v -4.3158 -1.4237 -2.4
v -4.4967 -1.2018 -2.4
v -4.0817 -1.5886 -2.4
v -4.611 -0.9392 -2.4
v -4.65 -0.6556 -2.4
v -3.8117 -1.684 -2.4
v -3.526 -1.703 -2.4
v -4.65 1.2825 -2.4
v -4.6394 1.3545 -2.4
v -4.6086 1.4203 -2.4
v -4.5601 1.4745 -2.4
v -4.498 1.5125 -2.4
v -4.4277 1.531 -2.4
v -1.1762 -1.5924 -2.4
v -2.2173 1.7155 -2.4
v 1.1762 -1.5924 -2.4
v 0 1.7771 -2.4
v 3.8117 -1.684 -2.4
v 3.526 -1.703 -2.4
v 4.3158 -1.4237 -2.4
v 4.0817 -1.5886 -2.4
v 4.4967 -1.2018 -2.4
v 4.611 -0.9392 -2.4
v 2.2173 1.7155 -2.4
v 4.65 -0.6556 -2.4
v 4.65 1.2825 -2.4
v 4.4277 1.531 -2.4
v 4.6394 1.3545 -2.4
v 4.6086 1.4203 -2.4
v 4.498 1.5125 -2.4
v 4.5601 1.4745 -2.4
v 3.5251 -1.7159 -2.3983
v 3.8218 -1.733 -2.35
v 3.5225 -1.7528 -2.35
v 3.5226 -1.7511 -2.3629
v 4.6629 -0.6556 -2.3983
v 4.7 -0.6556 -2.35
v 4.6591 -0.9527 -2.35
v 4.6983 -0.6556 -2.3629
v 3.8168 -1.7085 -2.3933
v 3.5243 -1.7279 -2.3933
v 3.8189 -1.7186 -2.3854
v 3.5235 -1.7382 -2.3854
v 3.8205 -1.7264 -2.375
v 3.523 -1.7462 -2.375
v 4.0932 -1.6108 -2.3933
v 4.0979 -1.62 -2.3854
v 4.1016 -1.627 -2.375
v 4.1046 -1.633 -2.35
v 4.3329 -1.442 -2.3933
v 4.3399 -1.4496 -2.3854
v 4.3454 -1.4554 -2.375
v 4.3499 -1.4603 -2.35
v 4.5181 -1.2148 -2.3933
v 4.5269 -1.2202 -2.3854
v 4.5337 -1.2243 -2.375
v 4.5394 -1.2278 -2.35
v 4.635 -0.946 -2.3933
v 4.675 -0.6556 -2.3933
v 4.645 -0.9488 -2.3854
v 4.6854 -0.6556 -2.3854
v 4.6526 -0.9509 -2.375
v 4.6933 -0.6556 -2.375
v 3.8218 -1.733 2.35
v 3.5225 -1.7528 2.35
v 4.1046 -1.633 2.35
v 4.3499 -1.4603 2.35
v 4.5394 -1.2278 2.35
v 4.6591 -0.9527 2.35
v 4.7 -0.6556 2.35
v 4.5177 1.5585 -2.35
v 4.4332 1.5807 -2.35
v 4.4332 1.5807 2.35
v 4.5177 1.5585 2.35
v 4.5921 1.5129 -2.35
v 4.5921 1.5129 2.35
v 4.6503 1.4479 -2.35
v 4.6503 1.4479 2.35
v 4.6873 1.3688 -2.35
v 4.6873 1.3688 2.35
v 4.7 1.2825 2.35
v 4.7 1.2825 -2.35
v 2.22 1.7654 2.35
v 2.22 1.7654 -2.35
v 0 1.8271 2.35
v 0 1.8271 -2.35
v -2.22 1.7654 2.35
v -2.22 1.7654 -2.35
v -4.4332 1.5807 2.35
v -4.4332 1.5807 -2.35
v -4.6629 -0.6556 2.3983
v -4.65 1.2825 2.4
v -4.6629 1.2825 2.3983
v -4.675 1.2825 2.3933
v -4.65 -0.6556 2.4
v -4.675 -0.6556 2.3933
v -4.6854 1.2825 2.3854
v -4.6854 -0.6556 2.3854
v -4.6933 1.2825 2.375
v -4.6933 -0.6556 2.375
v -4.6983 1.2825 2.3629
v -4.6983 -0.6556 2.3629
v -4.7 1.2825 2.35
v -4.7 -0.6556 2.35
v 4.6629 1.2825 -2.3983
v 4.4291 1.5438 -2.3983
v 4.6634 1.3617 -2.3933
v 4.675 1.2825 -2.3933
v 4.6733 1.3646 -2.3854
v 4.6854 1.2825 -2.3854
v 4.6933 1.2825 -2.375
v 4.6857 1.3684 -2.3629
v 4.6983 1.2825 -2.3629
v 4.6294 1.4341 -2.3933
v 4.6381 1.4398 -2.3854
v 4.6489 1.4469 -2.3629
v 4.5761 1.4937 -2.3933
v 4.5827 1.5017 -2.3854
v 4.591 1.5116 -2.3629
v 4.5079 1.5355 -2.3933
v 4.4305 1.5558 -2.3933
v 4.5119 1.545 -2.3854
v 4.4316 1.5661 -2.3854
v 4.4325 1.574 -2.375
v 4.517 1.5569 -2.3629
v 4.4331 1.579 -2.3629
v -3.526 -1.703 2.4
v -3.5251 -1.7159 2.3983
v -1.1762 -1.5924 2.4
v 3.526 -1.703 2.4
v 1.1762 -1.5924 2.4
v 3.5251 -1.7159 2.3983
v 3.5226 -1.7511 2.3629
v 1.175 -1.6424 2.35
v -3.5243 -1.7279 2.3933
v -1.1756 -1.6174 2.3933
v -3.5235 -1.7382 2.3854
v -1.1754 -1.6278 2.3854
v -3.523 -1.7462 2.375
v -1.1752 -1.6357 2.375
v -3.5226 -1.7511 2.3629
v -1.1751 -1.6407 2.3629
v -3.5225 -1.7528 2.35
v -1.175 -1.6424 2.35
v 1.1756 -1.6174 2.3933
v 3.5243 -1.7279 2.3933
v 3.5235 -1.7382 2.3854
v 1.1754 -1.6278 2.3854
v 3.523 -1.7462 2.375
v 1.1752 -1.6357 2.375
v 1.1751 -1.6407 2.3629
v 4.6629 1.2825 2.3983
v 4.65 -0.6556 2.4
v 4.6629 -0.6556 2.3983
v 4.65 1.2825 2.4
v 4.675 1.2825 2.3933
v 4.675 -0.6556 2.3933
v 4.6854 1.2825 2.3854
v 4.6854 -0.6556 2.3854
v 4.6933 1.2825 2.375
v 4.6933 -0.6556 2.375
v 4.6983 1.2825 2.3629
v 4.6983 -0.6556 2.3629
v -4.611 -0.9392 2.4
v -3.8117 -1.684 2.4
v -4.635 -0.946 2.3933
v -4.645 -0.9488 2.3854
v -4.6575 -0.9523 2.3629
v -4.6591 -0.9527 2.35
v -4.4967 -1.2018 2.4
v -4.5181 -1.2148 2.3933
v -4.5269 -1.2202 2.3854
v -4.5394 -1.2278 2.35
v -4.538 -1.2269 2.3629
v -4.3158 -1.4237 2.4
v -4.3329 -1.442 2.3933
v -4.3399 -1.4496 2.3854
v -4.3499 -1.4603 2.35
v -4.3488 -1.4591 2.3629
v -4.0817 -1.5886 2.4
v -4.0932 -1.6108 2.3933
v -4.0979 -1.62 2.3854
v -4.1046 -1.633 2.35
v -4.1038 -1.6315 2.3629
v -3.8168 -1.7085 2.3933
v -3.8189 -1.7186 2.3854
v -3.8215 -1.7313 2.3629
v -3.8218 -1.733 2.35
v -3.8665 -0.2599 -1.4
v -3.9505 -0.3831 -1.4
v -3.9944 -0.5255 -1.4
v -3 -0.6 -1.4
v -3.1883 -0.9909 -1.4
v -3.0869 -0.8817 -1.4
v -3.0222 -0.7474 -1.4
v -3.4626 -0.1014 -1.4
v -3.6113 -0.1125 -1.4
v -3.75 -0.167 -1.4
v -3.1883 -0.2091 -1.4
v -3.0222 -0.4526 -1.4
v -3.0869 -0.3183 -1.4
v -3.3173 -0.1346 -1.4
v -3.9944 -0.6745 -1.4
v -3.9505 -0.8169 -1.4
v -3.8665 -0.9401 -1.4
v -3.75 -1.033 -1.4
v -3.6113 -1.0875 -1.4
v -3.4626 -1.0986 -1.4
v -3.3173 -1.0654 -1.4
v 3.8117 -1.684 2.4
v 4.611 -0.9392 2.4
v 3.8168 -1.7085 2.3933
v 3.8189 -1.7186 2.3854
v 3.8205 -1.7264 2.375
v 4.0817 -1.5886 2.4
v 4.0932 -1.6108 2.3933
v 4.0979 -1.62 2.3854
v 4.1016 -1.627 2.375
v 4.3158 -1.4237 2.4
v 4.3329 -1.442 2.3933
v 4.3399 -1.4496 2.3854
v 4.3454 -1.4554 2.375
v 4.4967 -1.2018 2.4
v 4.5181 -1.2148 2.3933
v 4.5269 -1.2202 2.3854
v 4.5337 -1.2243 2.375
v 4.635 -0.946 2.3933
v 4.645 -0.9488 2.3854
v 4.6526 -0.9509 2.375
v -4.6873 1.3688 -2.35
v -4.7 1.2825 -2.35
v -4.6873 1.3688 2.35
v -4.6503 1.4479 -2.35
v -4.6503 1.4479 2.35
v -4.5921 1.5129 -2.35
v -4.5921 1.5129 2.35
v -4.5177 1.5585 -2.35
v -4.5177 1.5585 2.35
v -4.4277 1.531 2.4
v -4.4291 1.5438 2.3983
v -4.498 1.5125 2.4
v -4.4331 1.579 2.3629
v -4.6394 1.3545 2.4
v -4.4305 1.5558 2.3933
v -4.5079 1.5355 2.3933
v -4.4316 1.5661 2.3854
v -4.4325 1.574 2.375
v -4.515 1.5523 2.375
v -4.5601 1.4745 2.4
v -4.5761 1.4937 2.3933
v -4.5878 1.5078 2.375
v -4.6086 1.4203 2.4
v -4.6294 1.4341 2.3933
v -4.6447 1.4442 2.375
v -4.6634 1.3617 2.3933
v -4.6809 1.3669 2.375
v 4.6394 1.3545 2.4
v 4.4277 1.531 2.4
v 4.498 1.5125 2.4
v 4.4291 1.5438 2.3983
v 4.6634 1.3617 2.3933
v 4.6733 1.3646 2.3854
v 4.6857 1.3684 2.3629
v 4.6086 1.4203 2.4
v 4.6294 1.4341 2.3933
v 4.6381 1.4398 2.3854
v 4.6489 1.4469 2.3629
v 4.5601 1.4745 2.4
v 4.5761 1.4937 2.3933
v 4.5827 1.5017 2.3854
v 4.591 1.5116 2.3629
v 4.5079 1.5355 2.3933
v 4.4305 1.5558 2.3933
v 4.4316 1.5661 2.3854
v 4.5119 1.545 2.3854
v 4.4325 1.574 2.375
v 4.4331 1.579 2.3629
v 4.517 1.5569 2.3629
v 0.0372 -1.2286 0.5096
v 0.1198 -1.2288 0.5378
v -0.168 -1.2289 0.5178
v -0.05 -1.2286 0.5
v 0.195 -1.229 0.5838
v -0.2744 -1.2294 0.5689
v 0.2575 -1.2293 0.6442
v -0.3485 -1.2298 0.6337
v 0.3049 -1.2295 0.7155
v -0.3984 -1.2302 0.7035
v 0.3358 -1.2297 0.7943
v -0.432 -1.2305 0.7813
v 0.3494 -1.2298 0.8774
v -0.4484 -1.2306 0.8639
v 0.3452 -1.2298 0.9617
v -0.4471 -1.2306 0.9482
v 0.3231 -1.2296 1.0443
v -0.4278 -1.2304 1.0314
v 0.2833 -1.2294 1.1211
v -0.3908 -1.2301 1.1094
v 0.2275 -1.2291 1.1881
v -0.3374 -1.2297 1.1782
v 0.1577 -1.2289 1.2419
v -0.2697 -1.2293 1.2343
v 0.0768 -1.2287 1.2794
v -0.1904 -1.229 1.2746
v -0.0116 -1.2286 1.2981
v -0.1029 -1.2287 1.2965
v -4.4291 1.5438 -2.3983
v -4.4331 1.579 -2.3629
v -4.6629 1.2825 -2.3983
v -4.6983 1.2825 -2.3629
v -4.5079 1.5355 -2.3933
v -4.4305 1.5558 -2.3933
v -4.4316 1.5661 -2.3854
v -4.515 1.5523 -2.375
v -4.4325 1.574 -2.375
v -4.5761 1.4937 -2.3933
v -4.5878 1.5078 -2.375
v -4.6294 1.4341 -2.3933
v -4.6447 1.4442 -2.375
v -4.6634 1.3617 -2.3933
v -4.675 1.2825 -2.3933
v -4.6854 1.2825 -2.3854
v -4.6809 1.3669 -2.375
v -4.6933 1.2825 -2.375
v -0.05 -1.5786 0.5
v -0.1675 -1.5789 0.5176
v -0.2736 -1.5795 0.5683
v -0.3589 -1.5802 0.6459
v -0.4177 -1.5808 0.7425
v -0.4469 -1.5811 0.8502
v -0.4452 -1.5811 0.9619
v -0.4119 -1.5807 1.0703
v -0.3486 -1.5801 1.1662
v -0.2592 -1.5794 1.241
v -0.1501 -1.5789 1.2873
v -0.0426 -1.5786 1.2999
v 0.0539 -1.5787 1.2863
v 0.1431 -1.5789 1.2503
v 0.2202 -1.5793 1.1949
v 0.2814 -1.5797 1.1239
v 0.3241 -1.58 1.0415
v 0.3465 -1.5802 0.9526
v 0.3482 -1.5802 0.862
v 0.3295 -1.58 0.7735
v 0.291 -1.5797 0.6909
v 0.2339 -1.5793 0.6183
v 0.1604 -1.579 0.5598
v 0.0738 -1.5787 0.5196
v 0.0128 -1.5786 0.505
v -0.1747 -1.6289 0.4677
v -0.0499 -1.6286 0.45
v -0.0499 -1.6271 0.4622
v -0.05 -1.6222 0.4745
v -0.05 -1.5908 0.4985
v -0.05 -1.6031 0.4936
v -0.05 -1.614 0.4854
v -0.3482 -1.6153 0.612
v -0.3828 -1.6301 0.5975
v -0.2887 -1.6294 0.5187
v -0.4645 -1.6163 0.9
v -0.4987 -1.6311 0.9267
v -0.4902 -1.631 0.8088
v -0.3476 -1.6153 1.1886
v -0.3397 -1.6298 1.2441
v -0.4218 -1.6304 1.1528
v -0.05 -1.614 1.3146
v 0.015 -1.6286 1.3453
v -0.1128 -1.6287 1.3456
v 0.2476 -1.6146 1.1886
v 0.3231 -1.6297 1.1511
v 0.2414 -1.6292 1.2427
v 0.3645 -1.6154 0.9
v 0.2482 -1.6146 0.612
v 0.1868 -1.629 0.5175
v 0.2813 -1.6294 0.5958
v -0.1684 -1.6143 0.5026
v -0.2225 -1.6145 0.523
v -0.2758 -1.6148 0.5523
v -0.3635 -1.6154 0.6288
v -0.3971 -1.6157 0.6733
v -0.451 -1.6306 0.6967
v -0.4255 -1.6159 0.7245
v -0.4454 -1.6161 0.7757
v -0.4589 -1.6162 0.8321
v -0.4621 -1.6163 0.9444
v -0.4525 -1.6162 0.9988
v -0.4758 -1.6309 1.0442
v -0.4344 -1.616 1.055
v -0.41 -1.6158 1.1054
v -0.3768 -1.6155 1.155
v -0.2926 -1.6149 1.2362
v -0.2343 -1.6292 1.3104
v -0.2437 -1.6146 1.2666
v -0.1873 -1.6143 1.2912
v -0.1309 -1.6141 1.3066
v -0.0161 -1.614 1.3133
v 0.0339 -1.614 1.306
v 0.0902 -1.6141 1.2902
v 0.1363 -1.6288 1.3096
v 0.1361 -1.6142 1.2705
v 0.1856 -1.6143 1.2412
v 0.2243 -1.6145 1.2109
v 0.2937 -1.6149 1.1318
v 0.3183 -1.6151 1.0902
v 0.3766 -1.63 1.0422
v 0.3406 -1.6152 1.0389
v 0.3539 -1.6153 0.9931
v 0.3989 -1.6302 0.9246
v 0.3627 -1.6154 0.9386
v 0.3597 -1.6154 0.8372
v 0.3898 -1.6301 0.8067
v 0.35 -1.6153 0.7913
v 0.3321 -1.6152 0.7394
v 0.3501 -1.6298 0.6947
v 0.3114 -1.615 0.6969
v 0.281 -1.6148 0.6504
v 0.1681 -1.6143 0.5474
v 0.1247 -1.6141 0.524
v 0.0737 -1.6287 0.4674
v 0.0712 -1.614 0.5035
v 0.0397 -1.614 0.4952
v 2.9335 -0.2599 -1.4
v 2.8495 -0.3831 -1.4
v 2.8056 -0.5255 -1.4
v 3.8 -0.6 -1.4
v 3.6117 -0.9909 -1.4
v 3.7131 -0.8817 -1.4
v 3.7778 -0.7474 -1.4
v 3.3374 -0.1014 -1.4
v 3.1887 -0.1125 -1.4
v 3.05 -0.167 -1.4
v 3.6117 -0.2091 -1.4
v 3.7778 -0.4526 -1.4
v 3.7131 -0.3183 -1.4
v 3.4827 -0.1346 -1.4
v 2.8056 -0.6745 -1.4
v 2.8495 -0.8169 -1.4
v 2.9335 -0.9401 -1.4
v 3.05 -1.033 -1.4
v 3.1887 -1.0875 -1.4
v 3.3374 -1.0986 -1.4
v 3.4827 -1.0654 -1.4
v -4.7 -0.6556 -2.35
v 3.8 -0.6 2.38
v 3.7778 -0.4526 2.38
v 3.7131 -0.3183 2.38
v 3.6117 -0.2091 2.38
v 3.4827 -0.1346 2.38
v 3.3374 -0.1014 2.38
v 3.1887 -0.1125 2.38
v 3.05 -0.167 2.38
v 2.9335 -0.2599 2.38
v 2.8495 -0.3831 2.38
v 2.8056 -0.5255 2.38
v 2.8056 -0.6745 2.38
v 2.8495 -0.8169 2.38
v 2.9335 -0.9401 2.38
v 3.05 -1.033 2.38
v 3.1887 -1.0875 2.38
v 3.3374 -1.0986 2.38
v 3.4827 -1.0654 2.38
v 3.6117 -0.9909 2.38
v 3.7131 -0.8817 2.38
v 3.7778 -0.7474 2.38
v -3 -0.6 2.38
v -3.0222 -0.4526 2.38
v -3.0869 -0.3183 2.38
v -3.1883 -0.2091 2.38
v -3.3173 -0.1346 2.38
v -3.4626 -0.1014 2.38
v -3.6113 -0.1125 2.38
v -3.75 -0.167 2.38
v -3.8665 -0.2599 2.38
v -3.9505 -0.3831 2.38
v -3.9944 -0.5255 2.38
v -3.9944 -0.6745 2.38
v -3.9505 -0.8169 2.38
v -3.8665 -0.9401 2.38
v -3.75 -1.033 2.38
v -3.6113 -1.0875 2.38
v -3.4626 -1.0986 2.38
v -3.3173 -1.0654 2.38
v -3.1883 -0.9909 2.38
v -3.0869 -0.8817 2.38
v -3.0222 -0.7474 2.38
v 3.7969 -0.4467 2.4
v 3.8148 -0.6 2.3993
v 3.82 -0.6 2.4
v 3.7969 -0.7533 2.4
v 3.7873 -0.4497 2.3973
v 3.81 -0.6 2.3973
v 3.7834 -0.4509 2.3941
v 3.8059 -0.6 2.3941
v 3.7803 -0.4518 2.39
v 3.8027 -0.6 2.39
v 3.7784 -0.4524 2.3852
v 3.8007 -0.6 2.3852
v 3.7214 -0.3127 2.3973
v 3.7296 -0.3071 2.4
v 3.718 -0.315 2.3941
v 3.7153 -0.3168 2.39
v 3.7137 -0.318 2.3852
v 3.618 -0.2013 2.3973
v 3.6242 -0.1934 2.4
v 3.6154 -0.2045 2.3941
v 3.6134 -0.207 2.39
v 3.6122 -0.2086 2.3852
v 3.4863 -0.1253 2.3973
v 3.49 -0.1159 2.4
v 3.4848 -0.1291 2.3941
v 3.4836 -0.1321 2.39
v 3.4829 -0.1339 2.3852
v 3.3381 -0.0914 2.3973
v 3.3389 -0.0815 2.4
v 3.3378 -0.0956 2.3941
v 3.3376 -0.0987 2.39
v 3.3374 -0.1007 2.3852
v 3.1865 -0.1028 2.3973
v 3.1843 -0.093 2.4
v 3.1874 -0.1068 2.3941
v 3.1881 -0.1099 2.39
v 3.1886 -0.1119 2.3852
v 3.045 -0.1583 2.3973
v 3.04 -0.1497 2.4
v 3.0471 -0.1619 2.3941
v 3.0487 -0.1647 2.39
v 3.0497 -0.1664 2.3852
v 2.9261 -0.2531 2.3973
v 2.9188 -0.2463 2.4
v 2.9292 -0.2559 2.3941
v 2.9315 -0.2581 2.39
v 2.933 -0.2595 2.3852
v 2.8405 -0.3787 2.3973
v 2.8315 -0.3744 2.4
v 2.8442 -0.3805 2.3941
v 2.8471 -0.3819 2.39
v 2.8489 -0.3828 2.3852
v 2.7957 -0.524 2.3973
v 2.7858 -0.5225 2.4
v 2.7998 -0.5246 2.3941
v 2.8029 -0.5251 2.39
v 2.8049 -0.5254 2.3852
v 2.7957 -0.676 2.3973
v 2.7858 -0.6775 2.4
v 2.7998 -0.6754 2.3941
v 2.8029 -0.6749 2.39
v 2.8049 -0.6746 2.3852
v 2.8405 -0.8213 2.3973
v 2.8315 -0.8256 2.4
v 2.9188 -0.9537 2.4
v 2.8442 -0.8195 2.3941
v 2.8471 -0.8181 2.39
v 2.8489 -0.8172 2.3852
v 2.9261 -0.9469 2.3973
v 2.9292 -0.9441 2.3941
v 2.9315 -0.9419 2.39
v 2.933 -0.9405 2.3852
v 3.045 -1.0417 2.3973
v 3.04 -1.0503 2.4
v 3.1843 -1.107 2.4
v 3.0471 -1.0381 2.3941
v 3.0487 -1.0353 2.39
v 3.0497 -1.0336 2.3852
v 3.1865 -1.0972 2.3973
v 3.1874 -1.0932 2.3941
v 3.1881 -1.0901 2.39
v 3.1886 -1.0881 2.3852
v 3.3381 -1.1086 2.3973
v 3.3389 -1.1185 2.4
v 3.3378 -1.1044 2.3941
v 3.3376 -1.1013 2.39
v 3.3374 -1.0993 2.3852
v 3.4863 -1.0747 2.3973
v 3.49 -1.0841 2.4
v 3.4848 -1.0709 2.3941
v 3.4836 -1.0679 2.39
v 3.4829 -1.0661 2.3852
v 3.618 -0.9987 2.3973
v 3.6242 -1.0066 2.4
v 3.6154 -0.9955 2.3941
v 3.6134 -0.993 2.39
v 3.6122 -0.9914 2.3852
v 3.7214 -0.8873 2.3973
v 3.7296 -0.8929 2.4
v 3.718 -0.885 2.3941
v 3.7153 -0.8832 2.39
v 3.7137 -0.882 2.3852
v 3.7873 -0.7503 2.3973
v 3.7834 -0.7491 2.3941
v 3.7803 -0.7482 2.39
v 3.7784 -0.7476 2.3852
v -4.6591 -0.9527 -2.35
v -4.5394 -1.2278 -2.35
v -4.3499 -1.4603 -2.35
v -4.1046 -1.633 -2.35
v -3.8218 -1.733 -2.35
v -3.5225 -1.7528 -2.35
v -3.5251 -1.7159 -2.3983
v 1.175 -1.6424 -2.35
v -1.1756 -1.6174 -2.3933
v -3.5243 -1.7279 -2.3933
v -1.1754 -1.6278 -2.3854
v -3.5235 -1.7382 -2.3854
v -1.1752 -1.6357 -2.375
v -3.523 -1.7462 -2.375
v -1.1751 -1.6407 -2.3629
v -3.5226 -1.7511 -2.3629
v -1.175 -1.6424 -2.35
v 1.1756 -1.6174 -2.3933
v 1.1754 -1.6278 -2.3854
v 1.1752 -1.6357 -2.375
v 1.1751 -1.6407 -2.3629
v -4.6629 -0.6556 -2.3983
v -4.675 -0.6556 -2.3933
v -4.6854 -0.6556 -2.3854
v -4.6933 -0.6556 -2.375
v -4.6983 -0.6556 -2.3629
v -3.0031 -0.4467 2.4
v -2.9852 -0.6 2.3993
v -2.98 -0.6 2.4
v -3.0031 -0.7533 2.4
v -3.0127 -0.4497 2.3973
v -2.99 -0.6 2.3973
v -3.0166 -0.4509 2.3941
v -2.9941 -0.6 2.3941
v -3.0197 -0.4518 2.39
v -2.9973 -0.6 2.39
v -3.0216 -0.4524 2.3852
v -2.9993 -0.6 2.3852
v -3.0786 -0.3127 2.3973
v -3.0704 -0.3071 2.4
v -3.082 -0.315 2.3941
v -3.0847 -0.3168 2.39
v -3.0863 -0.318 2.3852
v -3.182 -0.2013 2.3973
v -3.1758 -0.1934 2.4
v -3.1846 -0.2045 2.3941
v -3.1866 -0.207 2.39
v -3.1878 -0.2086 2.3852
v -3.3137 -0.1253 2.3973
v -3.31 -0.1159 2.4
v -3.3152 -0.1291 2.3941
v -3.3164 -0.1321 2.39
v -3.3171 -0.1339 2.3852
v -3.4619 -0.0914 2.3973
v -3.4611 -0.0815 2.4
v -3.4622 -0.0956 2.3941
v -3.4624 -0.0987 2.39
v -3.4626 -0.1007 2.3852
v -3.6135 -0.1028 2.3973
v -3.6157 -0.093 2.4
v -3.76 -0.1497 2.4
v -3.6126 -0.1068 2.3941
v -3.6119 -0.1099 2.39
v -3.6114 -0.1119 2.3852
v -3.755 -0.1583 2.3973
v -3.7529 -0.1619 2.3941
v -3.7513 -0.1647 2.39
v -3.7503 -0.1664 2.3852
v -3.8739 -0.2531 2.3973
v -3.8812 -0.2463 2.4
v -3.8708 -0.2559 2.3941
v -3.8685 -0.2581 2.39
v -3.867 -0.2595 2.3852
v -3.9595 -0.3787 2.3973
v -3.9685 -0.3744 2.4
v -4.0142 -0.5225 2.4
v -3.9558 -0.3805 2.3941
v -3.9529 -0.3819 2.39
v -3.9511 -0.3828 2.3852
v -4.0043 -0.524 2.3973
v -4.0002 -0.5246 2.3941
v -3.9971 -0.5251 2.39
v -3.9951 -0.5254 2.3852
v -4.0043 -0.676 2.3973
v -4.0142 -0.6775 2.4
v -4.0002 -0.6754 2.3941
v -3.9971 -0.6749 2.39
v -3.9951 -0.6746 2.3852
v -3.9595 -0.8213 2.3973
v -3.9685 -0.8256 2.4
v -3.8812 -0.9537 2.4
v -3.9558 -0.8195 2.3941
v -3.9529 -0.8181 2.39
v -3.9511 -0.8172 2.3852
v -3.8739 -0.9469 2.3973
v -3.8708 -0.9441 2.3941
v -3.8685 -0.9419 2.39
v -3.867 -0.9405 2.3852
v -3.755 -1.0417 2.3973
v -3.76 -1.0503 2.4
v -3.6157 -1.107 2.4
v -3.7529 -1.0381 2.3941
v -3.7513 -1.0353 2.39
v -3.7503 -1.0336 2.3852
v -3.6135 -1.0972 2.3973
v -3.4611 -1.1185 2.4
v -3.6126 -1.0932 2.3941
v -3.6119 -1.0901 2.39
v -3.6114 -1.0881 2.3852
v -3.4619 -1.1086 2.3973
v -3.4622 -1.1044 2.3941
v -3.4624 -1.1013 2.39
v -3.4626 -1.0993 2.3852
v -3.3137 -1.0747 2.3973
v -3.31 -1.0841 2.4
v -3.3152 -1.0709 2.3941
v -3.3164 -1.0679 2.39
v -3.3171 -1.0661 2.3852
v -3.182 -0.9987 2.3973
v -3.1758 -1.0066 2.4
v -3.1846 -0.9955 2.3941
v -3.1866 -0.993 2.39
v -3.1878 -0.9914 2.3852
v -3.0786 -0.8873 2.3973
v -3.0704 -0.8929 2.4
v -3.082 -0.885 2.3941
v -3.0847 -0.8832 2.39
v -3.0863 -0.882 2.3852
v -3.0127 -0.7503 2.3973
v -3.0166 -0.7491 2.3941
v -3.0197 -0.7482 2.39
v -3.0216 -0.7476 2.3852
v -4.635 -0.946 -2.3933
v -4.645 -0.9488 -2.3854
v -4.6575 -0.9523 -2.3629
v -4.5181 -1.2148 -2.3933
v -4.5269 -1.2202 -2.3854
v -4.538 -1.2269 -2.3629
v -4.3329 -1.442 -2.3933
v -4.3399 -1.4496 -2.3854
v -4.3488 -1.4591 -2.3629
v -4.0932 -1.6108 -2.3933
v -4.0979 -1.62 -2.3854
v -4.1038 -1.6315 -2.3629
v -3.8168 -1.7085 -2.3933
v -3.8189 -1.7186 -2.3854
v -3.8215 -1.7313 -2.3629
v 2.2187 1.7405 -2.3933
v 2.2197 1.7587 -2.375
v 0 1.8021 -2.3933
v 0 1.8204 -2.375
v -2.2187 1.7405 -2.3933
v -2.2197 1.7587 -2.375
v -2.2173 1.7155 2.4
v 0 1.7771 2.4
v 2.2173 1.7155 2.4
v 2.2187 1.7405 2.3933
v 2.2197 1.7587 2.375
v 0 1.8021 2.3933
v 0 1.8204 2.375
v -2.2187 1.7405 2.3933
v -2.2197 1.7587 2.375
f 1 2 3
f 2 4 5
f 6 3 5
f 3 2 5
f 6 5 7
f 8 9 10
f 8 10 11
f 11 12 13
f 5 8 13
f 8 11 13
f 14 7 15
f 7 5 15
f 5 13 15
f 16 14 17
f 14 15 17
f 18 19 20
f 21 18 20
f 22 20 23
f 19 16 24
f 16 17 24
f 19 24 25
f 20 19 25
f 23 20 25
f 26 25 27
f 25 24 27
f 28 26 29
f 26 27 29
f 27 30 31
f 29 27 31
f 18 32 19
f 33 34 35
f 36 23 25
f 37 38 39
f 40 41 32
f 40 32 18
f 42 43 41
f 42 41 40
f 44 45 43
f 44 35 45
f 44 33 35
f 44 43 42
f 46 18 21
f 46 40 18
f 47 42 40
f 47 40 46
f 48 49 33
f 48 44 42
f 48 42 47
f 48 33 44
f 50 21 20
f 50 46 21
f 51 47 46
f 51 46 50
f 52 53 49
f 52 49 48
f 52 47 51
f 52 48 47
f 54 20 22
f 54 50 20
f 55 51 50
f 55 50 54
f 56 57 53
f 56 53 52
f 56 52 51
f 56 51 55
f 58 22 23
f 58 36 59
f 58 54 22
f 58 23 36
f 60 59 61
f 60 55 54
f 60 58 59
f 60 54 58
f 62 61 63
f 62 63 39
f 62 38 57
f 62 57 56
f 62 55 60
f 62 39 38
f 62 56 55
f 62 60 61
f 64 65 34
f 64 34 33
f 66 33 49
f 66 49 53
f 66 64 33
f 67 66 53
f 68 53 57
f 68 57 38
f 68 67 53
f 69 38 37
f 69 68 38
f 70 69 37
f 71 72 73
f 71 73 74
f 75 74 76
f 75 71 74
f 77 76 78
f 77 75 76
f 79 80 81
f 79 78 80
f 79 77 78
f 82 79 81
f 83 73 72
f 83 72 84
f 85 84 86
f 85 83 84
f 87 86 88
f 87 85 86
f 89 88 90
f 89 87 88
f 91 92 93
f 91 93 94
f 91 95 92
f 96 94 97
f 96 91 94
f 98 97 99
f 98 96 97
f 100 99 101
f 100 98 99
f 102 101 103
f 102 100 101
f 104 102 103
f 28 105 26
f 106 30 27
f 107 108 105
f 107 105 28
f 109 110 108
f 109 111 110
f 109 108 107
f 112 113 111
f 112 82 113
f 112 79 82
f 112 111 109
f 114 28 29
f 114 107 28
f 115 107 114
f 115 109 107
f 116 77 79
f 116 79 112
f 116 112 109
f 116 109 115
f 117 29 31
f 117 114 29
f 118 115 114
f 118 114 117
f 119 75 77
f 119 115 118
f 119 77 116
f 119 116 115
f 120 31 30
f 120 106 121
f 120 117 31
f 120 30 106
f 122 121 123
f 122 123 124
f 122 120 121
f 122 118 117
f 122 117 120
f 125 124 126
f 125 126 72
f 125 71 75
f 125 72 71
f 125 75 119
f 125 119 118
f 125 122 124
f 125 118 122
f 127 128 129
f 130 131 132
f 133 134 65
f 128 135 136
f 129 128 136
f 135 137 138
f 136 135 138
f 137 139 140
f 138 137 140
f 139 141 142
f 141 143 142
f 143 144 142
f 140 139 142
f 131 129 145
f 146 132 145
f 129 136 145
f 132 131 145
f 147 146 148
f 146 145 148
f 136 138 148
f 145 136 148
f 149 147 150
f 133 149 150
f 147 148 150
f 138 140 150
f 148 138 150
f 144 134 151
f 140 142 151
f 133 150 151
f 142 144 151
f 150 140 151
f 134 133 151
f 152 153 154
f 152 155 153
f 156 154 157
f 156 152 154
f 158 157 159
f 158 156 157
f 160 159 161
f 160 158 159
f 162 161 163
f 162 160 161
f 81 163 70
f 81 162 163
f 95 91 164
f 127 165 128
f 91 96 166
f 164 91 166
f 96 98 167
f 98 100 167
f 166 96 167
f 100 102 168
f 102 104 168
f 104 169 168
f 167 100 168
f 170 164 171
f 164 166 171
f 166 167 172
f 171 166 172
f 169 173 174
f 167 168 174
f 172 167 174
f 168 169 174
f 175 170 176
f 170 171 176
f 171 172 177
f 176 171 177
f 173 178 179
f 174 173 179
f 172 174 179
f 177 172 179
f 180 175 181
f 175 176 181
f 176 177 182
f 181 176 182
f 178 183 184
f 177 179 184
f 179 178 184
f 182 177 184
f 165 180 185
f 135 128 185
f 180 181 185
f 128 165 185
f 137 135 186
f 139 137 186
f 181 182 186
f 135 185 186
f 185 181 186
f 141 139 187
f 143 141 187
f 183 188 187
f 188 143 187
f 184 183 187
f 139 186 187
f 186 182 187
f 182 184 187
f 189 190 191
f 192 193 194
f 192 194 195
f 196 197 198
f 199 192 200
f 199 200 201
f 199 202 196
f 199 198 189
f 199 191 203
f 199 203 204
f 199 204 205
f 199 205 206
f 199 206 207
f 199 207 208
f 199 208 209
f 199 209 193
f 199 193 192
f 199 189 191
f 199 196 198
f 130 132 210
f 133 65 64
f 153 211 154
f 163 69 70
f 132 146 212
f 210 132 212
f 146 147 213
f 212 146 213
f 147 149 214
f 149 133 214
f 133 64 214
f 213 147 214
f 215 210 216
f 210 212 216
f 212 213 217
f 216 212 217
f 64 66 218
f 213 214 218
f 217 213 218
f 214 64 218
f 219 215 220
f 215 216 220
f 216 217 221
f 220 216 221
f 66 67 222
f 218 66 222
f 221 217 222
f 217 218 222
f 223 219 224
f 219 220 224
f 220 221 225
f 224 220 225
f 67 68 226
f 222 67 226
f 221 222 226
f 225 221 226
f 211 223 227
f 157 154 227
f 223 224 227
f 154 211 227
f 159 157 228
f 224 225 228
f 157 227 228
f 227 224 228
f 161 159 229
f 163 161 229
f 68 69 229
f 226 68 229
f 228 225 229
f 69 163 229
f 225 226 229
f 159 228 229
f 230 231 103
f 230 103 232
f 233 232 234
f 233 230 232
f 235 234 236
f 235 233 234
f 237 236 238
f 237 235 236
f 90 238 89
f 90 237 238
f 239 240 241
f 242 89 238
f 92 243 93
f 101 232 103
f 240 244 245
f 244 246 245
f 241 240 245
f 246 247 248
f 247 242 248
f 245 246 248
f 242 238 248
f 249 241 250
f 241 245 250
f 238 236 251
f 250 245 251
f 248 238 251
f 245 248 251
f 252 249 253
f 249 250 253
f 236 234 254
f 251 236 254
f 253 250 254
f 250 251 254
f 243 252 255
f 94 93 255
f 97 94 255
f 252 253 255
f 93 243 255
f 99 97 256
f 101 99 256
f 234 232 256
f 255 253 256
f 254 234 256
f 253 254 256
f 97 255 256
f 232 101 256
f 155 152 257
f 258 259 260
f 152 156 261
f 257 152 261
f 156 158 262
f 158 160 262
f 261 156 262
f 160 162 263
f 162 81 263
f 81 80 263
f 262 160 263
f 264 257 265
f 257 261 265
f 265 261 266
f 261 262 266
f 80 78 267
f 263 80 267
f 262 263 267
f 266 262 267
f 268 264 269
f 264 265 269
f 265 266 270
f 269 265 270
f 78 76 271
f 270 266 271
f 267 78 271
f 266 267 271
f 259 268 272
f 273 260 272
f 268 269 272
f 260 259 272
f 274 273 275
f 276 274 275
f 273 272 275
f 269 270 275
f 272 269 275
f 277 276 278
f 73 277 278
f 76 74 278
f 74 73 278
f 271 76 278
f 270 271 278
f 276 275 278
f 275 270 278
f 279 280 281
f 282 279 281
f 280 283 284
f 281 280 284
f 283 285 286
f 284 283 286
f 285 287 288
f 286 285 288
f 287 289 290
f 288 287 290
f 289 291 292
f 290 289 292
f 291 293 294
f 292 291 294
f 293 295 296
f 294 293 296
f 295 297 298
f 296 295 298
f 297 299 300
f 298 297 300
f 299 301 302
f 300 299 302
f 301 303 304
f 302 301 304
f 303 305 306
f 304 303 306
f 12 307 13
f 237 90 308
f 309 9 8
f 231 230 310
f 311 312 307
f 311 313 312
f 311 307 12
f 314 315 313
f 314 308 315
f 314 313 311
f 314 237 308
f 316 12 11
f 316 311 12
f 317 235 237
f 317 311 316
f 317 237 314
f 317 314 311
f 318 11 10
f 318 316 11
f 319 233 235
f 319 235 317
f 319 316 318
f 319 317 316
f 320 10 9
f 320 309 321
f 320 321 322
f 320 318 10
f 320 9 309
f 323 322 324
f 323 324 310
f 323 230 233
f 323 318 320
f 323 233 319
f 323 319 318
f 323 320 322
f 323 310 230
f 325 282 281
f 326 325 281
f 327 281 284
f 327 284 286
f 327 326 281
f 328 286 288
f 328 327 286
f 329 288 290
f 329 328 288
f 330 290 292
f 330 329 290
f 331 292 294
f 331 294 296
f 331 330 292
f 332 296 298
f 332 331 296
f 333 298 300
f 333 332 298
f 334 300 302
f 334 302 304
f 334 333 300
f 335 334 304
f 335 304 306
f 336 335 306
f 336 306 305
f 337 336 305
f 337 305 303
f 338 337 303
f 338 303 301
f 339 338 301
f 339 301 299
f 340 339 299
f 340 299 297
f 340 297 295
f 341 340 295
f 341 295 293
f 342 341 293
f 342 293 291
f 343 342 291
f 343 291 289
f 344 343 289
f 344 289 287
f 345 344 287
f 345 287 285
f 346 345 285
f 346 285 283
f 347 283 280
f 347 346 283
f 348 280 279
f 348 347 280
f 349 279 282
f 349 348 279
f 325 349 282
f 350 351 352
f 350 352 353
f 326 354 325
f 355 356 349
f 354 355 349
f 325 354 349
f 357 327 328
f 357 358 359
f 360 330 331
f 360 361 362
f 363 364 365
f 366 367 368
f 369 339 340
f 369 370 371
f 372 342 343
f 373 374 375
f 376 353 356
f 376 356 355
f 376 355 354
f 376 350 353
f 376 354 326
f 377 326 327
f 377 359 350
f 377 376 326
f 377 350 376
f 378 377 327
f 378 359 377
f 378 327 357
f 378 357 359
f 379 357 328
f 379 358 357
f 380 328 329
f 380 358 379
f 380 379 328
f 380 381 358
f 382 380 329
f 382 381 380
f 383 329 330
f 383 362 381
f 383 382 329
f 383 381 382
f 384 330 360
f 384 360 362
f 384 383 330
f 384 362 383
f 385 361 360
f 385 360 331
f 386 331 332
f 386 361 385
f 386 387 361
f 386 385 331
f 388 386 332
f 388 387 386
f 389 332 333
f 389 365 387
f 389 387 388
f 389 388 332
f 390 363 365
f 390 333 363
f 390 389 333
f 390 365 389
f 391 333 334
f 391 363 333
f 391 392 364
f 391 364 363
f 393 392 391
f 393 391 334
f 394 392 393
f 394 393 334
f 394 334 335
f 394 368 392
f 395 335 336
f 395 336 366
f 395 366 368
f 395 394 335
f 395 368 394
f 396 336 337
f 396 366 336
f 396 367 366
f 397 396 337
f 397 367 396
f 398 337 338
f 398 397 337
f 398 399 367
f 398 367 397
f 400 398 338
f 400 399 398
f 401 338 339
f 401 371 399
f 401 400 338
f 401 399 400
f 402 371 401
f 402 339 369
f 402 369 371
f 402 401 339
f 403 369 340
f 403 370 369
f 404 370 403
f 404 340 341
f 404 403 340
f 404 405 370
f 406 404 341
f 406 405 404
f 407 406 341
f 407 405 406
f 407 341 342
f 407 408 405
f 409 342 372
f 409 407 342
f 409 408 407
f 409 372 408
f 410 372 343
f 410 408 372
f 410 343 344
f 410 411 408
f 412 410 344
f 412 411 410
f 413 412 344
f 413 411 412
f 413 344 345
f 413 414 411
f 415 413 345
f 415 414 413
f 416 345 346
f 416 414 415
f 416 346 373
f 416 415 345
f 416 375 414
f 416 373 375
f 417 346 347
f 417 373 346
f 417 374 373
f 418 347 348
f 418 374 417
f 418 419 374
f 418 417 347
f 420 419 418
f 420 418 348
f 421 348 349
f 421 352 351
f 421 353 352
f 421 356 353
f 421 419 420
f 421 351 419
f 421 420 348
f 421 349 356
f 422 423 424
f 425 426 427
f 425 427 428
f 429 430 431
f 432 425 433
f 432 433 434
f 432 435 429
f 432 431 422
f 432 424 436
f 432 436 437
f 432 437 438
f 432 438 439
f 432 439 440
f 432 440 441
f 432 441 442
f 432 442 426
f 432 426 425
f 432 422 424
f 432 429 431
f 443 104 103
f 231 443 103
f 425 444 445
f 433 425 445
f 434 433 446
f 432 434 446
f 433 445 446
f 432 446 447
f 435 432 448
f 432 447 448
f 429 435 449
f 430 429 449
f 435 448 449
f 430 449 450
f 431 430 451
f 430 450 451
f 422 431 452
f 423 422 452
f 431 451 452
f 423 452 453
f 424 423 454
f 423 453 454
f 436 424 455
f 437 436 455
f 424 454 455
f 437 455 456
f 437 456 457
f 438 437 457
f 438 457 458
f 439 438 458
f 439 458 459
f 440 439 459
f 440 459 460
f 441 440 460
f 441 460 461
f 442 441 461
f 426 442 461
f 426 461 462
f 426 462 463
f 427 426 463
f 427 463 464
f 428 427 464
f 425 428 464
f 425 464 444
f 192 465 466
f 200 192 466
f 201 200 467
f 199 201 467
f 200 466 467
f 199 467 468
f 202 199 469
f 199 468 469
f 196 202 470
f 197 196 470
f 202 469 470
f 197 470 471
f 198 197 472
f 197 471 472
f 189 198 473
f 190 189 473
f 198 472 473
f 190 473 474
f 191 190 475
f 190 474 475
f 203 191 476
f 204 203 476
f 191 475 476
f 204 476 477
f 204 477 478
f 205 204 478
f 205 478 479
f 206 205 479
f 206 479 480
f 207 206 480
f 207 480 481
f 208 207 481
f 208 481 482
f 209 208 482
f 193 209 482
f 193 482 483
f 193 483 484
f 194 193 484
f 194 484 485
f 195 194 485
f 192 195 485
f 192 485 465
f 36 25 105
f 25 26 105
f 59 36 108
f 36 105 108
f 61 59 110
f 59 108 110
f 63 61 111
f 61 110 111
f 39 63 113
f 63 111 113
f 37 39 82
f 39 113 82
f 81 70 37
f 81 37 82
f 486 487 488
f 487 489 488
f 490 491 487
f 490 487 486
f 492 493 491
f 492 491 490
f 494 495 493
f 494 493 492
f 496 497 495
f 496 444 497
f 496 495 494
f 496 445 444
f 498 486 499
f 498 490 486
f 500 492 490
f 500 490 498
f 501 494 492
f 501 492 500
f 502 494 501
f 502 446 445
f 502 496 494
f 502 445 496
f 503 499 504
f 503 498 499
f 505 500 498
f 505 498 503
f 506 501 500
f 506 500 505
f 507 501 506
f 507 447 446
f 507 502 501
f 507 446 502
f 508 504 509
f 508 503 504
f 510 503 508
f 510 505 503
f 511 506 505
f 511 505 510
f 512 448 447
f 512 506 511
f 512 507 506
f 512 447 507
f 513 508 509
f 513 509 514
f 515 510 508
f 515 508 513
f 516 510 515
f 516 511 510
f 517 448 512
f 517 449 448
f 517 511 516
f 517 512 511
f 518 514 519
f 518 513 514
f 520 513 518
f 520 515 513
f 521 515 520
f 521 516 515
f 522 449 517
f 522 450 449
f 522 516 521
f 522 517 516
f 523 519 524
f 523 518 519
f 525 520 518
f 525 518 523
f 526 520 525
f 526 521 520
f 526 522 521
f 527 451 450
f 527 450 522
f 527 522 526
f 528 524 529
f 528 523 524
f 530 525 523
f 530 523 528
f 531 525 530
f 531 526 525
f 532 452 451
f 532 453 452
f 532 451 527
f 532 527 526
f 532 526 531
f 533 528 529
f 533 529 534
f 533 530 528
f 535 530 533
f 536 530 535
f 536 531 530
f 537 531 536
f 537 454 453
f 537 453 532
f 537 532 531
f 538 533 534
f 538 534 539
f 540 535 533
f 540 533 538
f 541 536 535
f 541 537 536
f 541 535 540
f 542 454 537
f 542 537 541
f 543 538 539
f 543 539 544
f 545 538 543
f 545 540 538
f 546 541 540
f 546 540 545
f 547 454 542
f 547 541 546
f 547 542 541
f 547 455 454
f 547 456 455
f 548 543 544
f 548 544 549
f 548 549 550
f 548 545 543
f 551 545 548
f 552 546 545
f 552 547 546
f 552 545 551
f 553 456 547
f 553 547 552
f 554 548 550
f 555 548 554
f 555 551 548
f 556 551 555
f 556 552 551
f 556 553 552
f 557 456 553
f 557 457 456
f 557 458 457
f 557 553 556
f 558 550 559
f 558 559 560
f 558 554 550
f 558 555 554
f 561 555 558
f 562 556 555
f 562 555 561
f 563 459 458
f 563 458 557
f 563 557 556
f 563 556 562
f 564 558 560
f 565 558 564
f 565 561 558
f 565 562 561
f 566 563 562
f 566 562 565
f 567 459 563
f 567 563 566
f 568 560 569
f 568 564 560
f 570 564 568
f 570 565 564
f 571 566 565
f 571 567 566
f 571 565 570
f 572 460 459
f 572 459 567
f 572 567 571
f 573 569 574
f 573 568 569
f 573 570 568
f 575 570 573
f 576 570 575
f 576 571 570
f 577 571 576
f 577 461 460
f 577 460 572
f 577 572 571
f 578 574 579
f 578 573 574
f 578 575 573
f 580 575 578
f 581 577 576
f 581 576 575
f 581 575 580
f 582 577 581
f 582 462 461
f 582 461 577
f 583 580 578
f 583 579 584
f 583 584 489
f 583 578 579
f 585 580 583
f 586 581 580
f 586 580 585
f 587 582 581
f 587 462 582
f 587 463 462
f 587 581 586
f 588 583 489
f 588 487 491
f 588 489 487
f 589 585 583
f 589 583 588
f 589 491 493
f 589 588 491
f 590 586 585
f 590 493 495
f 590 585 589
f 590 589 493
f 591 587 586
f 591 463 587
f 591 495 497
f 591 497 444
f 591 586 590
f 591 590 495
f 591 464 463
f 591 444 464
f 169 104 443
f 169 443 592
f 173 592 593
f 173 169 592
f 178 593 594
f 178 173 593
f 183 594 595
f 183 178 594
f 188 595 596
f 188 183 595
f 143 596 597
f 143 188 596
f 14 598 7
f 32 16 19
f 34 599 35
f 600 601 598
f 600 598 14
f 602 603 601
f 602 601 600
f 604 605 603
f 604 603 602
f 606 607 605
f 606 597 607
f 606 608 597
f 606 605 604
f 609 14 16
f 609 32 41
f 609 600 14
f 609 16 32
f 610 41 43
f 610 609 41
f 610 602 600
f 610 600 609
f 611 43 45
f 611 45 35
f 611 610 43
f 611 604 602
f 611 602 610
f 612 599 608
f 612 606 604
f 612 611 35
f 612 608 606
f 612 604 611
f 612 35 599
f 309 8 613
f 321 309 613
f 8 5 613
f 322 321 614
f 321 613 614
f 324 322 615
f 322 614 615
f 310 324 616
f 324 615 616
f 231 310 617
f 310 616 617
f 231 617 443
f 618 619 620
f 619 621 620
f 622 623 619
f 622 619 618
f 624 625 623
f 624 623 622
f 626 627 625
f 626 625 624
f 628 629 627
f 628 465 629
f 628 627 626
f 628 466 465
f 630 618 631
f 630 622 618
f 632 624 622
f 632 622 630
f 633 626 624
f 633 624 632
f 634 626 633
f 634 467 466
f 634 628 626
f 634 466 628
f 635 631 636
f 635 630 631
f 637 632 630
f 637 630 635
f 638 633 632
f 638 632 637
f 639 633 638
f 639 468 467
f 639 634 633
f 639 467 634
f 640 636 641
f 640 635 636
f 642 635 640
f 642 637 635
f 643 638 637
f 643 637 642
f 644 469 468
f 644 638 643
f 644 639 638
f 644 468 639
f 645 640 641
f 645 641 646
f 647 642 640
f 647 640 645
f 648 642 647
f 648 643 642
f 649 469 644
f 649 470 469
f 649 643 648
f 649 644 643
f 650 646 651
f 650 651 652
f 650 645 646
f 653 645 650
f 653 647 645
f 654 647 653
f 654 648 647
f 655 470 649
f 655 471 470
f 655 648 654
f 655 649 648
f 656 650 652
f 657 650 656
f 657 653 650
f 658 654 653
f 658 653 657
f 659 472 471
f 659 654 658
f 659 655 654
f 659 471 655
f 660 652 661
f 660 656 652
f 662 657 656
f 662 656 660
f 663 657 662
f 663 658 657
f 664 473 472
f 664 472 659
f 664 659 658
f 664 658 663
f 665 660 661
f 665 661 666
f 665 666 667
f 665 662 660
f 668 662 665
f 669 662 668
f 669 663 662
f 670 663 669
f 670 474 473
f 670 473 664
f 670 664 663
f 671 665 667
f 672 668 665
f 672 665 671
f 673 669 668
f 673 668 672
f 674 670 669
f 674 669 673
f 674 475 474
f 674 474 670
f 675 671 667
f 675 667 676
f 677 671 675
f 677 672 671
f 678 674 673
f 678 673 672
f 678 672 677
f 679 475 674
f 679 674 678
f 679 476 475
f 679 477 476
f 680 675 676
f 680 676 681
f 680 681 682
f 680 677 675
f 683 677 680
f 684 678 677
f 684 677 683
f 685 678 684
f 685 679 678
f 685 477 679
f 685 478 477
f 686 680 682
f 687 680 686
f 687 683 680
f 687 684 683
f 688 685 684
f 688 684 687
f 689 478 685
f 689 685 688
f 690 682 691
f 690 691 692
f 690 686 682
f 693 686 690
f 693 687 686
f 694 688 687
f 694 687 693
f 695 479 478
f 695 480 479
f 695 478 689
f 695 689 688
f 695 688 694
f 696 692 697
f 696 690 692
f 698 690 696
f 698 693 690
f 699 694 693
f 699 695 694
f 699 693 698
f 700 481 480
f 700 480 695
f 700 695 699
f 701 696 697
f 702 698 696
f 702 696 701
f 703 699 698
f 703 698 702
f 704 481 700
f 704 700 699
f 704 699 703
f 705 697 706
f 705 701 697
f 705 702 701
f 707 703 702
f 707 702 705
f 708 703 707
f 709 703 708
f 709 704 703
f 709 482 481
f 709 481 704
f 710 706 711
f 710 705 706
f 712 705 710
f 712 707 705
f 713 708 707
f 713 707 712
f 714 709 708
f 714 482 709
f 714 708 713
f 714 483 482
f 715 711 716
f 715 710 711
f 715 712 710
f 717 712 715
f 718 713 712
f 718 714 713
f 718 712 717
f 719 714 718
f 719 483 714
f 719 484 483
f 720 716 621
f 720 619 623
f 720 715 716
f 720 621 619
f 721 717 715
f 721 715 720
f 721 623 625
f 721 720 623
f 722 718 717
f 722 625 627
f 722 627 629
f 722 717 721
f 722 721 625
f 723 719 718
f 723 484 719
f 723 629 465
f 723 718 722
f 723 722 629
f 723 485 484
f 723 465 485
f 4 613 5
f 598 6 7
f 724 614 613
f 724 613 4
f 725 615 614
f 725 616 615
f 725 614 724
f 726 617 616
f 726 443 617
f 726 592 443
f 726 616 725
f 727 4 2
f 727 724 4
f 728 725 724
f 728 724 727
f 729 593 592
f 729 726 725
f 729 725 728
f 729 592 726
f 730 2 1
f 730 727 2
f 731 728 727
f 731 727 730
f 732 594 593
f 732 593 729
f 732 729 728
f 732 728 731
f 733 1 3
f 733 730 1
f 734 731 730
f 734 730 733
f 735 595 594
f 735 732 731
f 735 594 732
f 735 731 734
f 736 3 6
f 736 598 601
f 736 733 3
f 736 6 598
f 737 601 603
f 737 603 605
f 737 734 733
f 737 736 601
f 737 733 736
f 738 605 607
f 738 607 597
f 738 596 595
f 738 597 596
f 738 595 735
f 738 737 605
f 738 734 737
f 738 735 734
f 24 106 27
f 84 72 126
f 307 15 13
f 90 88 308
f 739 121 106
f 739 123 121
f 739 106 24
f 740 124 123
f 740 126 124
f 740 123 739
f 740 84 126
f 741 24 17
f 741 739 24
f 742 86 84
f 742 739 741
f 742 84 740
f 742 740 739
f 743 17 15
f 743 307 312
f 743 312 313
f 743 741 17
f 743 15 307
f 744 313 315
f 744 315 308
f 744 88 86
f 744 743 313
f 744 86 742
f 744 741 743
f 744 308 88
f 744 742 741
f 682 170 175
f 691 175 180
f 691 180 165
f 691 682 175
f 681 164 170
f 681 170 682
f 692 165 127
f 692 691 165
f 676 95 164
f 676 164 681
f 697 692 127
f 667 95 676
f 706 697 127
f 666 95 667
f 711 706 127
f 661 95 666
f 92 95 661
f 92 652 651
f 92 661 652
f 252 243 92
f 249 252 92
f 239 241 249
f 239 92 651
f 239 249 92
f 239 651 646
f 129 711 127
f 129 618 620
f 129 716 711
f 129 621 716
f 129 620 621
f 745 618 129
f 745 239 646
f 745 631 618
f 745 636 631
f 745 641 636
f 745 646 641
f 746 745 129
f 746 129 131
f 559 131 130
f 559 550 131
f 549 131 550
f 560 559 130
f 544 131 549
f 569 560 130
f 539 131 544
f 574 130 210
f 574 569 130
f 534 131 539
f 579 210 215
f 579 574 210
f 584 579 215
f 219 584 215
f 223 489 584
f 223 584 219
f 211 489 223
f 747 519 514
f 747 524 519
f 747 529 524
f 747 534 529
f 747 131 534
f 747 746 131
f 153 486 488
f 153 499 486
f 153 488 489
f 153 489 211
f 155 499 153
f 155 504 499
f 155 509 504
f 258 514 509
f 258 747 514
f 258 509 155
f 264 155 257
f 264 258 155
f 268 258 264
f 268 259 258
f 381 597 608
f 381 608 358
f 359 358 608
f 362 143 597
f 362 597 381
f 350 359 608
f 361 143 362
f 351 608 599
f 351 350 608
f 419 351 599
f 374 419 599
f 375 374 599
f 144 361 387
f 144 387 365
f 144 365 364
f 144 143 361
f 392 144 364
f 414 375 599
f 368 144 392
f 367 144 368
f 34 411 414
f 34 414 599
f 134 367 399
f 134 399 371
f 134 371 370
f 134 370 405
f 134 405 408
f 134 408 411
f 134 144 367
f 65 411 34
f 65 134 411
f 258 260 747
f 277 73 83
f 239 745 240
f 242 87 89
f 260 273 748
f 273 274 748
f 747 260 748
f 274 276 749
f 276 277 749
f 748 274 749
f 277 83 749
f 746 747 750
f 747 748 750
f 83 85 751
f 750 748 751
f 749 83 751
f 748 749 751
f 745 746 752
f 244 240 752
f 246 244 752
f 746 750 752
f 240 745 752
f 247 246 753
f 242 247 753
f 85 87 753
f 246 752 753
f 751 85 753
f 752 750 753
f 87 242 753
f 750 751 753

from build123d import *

# Parameters (mm, degrees)
SKETCH1_W               = 9.4
SKETCH1_H               = 3.7
BOSS_EXTRUDE1_DEPTH     = 2.4
CUT_EXTRUDE1_DEPTH      = 4.8
FILLET1_R               = 1.1
FILLET2_R               = 0.3
FILLET3_R               = 0.05
CUT_EXTRUDE2_START      = 1
SKETCH3_R               = 0.5
CUT_EXTRUDE2_DEPTH      = 4.8
FILLET4_R               = 0.02
CUT_EXTRUDE3_REACH      = 17.585
CUT_EXTRUDE3_END_RADIUS = 50.4
CUT_EXTRUDE3_START      = -10
SKETCH4_R               = 0.4
FILLET5_R               = 0.05


with BuildPart() as part:
    # Sketch1 → Boss-Extrude1 (new, symmetric)
    with BuildSketch(Plane.XY):
        Rectangle(SKETCH1_W, SKETCH1_H)
    extrude(amount=BOSS_EXTRUDE1_DEPTH, both=True)

    # Sketch2 → Cut-Extrude1 (cut)
    with BuildSketch(Plane.XY.offset(2.4)):
        with BuildLine():
            Line((-4.7, 1.55), (-7.120690005, 4.011417256))
            Line((-7.120690005, 4.011417256), (5.535860742, 3.886722174))
            Line((5.535860742, 3.886722174), (4.7, 1.55))
            ThreePointArc((4.7, 1.55), (0, 1.827084699), (-4.7, 1.55))
        make_face()
        with BuildLine():
            Line((4.7, -1.85), (0.350623614, -3.782025322))
            Line((0.350623614, -3.782025322), (-4.7, -1.85))
            ThreePointArc((-4.7, -1.85), (0, -1.628609864), (4.7, -1.85))
        make_face()
    extrude(amount=-CUT_EXTRUDE1_DEPTH, mode=Mode.SUBTRACT)

    # Fillet1
    fillet1_edges = [part.edges().sort_by_distance(p)[0] for p in [
        (4.7, -1.85, 0),
        (-4.7, -1.85, 0),
    ]]
    fillet(fillet1_edges, radius=FILLET1_R)

    # Fillet2
    fillet2_edges = [part.edges().sort_by_distance(p)[0] for p in [
        (4.7, 1.55, 0),
        (-4.7, 1.55, 0),
    ]]
    fillet(fillet2_edges, radius=FILLET2_R)

    # Fillet3
    fillet3_edges = [part.edges().sort_by_distance(p)[0] for p in [
        (4.7, 0.3134624, -2.4),
        (4.7, 0.3134624, 2.4),
        (0, -1.628609864, -2.4),
        (-4.349918456, -1.460327621, -2.4),
        (4.349918456, -1.460327621, -2.4),
        (0, -1.628609864, 2.4),
        (-4.349918456, -1.460327621, 2.4),
        (4.349918456, -1.460327621, 2.4),
        (0, 1.827084699, 2.4),
        (-4.7, 0.3134624, 2.4),
        (-4.623578634, 1.482534062, 2.4),
        (4.623578634, 1.482534062, 2.4),
        (0, 1.827084699, -2.4),
        (-4.7, 0.3134624, -2.4),
        (-4.623578634, 1.482534062, -2.4),
        (4.623578634, 1.482534062, -2.4),
    ]]
    fillet(fillet3_edges, radius=FILLET3_R)

    # Sketch3 → Cut-Extrude2 (cut)
    with BuildSketch(Plane.XY.offset(2.4).offset(CUT_EXTRUDE2_START)):
        with Locations((3.3, -0.6)):
            Circle(SKETCH3_R)
        with Locations((-3.5, -0.6)):
            Circle(SKETCH3_R)
    extrude(amount=-CUT_EXTRUDE2_DEPTH, mode=Mode.SUBTRACT)

    # Fillet4
    fillet4_edges = [part.edges().sort_by_distance(p)[0] for p in [
        (2.8, -0.6, 2.4),
        (-4, -0.6, 2.4),
    ]]
    fillet(fillet4_edges, radius=FILLET4_R)

    # Cut-Extrude3: up to this cylinder (the profile starts inside it)
    cut_extrude3_end = Plane(origin=(0, -51.628609864, 0.9), z_dir=(0, 0, 1)) * Cylinder(CUT_EXTRUDE3_END_RADIUS, 136.97, mode=Mode.PRIVATE)
    # Sketch4 → Cut-Extrude3 (cut, up to the surface)
    with BuildSketch(Plane(origin=(0, 0, 0), x_dir=(1, 0, 0), z_dir=(0, 1, 0)).offset(CUT_EXTRUDE3_START), mode=Mode.PRIVATE) as cut_extrude3_sk1:
        with Locations(Location((-0.05, -0.9, 0), (0, 0, 90))):
            Circle(SKETCH4_R)
    cut_extrude3_tool1 = extrude(cut_extrude3_sk1.sketch, amount=CUT_EXTRUDE3_REACH, mode=Mode.PRIVATE) & cut_extrude3_end
    add(cut_extrude3_tool1.solids().sort_by_distance((-0.05, -10, 0.9))[0], mode=Mode.SUBTRACT)

    # Fillet5
    fillet5_edges = [part.edges().sort_by_distance(p)[0] for p in [
        (-0.050002133, -1.628634866, 1.3),
    ]]
    fillet(fillet5_edges, radius=FILLET5_R)


solid = part.part
